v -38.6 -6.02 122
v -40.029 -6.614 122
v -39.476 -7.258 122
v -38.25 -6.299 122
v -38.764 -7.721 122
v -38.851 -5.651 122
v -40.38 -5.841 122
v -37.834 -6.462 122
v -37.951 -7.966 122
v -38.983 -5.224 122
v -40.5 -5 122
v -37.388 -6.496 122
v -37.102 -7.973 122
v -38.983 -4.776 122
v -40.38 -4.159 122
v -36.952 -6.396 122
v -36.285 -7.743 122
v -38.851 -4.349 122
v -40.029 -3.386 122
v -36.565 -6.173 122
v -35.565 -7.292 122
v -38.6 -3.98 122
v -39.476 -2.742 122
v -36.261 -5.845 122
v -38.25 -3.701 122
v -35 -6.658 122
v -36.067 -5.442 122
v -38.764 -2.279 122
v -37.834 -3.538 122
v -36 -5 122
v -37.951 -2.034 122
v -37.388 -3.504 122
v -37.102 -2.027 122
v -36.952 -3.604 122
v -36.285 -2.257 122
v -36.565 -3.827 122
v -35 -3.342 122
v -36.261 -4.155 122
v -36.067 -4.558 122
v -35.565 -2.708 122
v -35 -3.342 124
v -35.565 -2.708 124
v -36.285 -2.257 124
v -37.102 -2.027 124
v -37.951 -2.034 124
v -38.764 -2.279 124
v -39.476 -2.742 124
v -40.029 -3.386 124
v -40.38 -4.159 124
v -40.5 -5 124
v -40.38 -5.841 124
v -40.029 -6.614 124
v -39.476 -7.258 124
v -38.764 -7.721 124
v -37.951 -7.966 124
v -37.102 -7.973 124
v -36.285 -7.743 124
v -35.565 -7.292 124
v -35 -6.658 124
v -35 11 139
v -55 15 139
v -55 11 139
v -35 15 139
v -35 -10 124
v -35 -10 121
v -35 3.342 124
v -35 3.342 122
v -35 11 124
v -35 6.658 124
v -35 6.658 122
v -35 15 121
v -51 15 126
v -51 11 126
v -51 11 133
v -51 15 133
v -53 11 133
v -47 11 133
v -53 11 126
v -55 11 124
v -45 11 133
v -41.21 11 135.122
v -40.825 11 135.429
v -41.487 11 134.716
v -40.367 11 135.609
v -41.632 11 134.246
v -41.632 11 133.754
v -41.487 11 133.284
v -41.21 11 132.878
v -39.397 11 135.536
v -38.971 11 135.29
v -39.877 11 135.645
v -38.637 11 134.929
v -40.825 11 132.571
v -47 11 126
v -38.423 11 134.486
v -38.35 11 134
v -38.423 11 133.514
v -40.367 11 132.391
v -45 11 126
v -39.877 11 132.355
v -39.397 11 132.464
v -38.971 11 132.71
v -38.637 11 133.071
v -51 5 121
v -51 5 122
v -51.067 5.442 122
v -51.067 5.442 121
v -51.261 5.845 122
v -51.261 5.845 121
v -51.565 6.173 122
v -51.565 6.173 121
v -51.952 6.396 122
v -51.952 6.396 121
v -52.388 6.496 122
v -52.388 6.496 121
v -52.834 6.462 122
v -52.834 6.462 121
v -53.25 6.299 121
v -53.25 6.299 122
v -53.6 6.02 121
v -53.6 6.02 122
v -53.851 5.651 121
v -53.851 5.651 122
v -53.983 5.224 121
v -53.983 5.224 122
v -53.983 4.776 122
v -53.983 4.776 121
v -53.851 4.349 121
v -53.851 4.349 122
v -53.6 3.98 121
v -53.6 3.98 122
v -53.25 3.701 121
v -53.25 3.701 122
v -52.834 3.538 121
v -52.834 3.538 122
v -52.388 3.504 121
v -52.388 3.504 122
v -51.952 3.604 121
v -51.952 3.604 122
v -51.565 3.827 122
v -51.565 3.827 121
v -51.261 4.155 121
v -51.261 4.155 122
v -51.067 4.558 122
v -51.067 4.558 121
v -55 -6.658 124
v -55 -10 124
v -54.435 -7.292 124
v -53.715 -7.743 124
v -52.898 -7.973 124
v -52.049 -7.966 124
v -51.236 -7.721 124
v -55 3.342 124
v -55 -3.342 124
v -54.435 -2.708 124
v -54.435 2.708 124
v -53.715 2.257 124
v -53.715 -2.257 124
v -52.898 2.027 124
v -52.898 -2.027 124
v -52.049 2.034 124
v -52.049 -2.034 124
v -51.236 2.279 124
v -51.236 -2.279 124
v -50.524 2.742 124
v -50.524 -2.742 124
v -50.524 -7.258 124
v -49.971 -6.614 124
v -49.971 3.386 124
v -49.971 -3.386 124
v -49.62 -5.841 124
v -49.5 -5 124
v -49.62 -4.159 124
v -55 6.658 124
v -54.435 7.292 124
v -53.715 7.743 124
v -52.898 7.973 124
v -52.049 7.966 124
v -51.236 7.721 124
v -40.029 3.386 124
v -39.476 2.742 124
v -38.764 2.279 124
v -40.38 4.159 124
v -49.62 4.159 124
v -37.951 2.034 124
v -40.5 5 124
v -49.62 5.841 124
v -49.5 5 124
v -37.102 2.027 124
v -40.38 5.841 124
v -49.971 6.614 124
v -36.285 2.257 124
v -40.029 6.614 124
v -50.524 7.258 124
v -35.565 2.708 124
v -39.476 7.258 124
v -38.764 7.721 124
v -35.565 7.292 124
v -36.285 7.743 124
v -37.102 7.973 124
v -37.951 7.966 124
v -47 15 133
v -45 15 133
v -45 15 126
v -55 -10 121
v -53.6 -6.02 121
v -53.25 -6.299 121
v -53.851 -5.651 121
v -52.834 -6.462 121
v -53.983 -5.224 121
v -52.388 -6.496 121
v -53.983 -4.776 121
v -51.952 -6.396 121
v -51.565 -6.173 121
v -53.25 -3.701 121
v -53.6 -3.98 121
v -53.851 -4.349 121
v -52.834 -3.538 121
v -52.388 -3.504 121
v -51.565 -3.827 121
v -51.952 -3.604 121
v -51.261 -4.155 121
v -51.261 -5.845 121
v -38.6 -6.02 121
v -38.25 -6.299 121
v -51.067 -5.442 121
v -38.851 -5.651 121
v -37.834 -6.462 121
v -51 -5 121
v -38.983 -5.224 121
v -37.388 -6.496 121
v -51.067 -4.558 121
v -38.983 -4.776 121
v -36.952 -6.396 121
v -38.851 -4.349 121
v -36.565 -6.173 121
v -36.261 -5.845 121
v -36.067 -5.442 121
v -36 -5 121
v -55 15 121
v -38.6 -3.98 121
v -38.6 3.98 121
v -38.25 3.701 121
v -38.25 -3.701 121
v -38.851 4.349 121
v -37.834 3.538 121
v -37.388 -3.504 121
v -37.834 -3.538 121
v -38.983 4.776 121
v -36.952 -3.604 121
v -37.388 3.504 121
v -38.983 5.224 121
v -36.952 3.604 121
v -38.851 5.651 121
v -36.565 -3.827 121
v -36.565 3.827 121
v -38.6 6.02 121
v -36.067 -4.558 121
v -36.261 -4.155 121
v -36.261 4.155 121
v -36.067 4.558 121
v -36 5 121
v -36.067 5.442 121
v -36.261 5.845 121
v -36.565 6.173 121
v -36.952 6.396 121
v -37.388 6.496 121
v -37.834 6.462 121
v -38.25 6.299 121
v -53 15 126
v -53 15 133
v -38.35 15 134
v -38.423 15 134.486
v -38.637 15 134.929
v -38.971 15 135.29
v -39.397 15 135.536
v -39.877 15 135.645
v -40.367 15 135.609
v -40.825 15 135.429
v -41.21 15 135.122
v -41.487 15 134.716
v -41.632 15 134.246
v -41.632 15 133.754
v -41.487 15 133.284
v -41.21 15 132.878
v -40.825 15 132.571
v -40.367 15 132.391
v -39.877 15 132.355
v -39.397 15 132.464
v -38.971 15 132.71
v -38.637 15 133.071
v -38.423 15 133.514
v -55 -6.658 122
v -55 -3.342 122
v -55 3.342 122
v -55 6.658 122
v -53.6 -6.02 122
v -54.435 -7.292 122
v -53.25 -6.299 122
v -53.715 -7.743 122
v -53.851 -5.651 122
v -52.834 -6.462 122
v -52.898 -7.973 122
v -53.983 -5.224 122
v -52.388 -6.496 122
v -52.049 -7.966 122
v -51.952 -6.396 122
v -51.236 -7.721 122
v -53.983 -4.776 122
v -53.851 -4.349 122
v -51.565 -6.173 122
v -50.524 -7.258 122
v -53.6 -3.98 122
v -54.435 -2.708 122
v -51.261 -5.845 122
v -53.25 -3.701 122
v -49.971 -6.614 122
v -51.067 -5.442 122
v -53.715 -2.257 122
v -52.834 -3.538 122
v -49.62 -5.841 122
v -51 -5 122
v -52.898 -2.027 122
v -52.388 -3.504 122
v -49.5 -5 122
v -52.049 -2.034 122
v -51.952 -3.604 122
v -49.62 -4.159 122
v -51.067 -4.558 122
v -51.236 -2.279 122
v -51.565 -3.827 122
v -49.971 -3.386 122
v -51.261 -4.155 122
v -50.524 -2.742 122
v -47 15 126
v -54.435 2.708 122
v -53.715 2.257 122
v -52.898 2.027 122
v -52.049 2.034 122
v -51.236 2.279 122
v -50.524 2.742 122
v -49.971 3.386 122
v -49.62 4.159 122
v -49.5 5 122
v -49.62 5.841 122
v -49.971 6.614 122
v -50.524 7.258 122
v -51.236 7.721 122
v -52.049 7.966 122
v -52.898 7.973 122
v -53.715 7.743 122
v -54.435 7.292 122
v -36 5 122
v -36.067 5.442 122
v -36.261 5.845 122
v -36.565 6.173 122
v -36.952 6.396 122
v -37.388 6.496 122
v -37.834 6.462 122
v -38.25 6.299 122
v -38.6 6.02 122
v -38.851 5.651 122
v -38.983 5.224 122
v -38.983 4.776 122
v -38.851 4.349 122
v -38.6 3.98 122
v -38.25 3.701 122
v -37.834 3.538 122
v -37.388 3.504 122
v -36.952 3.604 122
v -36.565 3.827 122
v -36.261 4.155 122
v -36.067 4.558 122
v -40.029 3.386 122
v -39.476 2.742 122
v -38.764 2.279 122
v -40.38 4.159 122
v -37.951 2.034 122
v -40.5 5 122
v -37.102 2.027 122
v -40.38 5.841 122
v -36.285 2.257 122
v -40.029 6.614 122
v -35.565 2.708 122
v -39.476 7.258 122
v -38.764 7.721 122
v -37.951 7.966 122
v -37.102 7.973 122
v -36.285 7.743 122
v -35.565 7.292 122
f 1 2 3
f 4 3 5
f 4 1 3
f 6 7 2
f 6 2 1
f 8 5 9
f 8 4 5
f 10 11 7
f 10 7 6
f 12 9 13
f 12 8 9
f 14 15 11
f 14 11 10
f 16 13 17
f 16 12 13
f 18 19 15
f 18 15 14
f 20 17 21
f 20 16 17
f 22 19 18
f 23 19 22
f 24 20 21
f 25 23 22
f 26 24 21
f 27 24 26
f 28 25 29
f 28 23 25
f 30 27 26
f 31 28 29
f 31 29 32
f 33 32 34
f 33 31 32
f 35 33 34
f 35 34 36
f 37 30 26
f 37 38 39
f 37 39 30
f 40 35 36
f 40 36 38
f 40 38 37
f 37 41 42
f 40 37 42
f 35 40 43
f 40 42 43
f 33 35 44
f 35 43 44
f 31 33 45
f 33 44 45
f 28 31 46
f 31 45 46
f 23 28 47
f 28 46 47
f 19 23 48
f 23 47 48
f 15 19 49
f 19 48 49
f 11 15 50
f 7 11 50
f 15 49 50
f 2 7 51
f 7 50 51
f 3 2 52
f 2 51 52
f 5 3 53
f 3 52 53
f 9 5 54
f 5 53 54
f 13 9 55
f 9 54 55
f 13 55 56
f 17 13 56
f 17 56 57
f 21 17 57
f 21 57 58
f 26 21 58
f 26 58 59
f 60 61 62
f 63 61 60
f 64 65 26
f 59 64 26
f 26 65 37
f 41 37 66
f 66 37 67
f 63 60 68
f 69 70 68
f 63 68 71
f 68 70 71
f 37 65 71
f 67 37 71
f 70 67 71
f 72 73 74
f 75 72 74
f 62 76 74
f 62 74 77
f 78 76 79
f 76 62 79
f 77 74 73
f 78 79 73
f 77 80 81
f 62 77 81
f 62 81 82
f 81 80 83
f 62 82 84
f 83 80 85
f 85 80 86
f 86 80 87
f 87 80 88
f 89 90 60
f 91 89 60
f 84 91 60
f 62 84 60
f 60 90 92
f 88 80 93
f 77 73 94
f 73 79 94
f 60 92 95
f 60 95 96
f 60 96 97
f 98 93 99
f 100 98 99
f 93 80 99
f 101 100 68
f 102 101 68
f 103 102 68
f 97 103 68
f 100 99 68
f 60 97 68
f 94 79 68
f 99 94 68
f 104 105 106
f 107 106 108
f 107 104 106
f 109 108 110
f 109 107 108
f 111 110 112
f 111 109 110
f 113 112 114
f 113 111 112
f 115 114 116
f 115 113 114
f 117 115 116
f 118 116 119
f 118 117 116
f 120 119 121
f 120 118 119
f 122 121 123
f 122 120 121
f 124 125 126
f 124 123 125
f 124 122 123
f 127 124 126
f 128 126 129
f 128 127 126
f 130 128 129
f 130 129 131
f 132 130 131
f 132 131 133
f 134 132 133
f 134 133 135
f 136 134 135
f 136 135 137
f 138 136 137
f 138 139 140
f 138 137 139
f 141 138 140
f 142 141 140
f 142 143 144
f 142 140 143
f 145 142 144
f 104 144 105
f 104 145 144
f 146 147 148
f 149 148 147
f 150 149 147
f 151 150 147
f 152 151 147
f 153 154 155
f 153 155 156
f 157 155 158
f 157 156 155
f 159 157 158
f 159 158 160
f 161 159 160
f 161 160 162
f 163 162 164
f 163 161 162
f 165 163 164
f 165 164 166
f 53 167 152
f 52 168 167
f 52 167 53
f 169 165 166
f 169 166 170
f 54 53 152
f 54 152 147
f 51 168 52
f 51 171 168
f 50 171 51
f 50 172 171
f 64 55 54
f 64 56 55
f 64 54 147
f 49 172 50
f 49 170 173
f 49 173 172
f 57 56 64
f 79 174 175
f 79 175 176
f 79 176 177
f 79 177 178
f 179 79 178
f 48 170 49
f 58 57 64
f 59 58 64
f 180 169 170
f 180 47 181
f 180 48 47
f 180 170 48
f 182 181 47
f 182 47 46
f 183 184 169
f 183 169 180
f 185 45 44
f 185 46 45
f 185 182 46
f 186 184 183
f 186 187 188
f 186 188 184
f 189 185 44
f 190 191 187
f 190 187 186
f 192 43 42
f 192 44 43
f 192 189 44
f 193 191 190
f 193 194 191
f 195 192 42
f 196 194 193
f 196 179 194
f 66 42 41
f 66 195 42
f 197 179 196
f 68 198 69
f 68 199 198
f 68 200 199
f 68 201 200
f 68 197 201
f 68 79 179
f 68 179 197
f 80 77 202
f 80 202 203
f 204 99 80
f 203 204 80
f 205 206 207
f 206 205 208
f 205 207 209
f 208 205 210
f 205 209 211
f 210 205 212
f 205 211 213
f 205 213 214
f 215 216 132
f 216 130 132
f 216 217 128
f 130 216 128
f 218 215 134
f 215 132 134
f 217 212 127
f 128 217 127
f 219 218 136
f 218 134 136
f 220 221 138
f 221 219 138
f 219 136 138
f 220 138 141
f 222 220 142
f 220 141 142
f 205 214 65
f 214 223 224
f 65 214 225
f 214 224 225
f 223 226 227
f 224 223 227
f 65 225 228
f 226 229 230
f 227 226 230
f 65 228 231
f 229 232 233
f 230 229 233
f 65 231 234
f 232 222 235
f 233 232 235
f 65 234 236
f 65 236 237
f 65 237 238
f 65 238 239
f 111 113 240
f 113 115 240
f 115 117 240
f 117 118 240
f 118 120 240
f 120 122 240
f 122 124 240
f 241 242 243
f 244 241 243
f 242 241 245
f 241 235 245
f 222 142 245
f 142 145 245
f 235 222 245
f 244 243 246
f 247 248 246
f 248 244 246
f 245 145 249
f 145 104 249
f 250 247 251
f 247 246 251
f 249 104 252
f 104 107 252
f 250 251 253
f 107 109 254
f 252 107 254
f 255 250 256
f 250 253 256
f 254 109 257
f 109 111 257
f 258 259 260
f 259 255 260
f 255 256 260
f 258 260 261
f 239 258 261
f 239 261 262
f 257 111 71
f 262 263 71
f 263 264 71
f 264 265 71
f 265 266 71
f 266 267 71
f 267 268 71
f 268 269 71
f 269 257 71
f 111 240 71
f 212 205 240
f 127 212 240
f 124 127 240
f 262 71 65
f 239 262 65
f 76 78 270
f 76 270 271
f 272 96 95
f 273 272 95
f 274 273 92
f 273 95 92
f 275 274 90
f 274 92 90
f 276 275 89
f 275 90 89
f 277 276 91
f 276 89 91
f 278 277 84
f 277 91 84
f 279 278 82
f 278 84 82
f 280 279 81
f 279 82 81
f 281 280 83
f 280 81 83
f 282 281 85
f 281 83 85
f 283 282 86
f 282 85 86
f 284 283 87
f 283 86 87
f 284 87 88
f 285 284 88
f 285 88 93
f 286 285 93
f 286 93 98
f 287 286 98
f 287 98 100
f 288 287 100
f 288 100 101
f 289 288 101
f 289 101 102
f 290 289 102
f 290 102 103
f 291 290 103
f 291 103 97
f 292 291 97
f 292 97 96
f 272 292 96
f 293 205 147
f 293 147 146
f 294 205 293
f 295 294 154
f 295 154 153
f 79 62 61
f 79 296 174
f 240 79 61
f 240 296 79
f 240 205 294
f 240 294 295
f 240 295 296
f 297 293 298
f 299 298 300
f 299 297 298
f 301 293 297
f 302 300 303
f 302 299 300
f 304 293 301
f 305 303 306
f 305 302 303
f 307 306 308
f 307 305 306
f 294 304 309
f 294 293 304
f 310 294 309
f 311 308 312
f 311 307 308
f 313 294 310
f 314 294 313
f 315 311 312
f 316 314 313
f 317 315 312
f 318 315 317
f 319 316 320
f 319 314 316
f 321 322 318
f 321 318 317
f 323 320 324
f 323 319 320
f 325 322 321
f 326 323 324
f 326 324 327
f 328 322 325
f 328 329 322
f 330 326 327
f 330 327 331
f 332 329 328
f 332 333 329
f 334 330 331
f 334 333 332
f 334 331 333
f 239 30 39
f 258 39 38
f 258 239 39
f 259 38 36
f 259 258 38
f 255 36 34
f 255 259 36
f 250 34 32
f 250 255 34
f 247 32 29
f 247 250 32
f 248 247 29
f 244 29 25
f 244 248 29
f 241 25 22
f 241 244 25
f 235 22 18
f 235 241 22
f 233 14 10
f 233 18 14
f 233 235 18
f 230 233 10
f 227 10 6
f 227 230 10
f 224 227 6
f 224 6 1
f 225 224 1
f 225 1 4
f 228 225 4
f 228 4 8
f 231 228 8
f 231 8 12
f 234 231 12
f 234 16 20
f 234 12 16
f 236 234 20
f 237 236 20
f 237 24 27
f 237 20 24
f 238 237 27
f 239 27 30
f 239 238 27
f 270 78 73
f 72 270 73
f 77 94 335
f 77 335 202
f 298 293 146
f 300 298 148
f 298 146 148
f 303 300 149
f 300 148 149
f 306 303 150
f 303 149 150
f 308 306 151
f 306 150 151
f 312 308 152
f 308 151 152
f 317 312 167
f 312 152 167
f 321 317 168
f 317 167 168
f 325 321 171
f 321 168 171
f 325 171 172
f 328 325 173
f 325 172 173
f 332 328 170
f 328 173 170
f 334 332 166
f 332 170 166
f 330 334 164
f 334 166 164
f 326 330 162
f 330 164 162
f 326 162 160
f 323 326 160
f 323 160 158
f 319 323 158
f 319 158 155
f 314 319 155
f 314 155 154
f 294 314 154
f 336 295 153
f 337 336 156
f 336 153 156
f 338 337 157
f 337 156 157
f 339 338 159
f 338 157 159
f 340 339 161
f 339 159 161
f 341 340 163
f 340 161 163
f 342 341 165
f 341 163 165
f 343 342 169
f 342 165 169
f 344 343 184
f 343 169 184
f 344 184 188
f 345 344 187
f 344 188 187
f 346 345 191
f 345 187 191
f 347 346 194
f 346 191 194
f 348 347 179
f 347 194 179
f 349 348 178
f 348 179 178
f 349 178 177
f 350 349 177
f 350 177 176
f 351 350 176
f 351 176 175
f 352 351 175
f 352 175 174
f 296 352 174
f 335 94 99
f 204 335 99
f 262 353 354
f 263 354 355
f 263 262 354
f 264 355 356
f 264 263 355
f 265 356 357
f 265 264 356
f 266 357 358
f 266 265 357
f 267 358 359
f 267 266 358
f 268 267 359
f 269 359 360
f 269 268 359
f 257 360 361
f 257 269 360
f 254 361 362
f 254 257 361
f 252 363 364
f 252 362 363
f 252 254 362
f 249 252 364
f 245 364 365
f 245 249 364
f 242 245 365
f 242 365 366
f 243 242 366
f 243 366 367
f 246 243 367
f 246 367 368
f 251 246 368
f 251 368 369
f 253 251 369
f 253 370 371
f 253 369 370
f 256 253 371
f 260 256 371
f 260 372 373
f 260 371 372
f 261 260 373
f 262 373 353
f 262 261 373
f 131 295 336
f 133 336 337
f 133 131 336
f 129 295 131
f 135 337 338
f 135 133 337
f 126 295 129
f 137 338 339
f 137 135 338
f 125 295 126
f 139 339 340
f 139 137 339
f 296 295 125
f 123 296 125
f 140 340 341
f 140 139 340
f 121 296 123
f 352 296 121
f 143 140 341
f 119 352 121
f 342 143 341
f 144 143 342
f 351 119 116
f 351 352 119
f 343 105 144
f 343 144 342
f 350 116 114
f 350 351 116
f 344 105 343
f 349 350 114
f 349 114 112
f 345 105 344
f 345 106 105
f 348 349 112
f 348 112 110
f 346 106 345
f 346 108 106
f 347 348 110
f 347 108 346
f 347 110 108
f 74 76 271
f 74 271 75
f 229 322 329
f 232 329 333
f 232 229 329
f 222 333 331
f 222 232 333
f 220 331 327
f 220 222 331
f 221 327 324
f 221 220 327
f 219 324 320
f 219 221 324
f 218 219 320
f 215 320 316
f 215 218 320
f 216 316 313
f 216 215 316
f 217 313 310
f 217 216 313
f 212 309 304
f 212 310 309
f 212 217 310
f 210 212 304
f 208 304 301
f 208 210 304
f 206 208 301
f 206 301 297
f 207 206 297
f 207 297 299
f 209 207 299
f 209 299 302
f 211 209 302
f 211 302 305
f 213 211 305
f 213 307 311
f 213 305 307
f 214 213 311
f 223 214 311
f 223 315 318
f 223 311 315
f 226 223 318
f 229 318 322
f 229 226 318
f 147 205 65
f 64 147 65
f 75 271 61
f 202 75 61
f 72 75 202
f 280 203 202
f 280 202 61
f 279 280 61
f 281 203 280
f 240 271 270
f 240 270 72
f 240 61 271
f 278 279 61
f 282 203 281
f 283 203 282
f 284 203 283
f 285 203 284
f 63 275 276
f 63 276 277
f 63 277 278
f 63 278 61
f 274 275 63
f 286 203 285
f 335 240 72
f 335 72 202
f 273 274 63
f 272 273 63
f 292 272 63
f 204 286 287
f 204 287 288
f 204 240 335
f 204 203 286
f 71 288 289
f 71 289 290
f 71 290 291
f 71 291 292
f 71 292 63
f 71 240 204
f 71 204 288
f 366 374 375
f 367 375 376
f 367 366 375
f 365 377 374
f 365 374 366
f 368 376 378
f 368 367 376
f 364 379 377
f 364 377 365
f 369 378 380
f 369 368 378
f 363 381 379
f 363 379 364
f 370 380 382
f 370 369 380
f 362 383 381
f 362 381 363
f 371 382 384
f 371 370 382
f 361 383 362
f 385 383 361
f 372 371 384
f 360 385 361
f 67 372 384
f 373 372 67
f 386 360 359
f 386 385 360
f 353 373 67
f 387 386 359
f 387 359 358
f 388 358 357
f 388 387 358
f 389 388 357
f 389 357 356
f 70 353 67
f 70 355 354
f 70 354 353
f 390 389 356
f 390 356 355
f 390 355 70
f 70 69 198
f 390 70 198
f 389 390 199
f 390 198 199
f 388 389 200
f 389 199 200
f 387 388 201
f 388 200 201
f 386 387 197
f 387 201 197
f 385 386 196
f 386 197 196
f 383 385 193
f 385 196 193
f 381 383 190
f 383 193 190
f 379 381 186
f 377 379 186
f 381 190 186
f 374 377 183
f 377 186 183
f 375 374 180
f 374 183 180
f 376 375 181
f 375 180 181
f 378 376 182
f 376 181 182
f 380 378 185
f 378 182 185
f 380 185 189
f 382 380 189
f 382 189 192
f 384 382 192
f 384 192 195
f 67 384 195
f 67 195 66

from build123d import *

# Parameters (mm, degrees)
SKETCH067_W     = 20
SKETCH067_H     = 25
SKETCH067_R     = 1.5
PAD024_DEPTH    = 3
SKETCH068_R     = 3
POCKET043_DEPTH = 2
SKETCH069_W     = 20
SKETCH069_H     = 4
PAD025_DEPTH    = 15
SKETCH085_R     = 1.65
SKETCH085_W     = 2
SKETCH085_H     = 7
POCKET052_DEPTH = 5


with BuildPart() as part:
    # Sketch067 → Pad024 (new body)
    with BuildSketch(Plane.XY):
        with Locations((-45, 2.5)):
            Rectangle(SKETCH067_W, SKETCH067_H)
        with Locations((-52.5, 5)):
            Circle(SKETCH067_R, mode=Mode.SUBTRACT)
        with Locations((-37.5, 5)):
            Circle(SKETCH067_R, mode=Mode.SUBTRACT)
        with Locations((-37.5, -5)):
            Circle(SKETCH067_R, mode=Mode.SUBTRACT)
        with Locations((-52.5, -5)):
            Circle(SKETCH067_R, mode=Mode.SUBTRACT)
    extrude(amount=PAD024_DEPTH)

    # Sketch068 (on Face10 of Pad024) → Pocket043 (cut)
    with BuildSketch(Plane.XY.offset(3)):
        with Locations((-52.5, 5)):
            Circle(SKETCH068_R)
        with Locations((-37.5, 5)):
            Circle(SKETCH068_R)
        with Locations((-37.5, -5)):
            Circle(SKETCH068_R)
        with Locations((-52.5, -5)):
            Circle(SKETCH068_R)
    extrude(amount=-POCKET043_DEPTH, mode=Mode.SUBTRACT)

    # Sketch069 (on Face5 of Pocket043) → Pad025 (join)
    with BuildSketch(Plane.XY.offset(3)):
        with Locations((-45, 13)):
            Rectangle(SKETCH069_W, SKETCH069_H)
    extrude(amount=PAD025_DEPTH)

    # Sketch085 (on Face25 of Pad025) → Pocket052 (cut)
    with BuildSketch(Plane.XZ.offset(-11)):
        with Locations((-40, 13)):
            Circle(SKETCH085_R)
        with Locations((-52, 8.5)):
            Rectangle(SKETCH085_W, SKETCH085_H)
        with Locations((-46, 8.5)):
            Rectangle(SKETCH085_W, SKETCH085_H)
    extrude(amount=-POCKET052_DEPTH, mode=Mode.SUBTRACT)


with BuildPart() as part_1:
    # Body008 placement: moved
    add(part.part.moved(Location((0, 0, 121))))


solid = part_1.part
